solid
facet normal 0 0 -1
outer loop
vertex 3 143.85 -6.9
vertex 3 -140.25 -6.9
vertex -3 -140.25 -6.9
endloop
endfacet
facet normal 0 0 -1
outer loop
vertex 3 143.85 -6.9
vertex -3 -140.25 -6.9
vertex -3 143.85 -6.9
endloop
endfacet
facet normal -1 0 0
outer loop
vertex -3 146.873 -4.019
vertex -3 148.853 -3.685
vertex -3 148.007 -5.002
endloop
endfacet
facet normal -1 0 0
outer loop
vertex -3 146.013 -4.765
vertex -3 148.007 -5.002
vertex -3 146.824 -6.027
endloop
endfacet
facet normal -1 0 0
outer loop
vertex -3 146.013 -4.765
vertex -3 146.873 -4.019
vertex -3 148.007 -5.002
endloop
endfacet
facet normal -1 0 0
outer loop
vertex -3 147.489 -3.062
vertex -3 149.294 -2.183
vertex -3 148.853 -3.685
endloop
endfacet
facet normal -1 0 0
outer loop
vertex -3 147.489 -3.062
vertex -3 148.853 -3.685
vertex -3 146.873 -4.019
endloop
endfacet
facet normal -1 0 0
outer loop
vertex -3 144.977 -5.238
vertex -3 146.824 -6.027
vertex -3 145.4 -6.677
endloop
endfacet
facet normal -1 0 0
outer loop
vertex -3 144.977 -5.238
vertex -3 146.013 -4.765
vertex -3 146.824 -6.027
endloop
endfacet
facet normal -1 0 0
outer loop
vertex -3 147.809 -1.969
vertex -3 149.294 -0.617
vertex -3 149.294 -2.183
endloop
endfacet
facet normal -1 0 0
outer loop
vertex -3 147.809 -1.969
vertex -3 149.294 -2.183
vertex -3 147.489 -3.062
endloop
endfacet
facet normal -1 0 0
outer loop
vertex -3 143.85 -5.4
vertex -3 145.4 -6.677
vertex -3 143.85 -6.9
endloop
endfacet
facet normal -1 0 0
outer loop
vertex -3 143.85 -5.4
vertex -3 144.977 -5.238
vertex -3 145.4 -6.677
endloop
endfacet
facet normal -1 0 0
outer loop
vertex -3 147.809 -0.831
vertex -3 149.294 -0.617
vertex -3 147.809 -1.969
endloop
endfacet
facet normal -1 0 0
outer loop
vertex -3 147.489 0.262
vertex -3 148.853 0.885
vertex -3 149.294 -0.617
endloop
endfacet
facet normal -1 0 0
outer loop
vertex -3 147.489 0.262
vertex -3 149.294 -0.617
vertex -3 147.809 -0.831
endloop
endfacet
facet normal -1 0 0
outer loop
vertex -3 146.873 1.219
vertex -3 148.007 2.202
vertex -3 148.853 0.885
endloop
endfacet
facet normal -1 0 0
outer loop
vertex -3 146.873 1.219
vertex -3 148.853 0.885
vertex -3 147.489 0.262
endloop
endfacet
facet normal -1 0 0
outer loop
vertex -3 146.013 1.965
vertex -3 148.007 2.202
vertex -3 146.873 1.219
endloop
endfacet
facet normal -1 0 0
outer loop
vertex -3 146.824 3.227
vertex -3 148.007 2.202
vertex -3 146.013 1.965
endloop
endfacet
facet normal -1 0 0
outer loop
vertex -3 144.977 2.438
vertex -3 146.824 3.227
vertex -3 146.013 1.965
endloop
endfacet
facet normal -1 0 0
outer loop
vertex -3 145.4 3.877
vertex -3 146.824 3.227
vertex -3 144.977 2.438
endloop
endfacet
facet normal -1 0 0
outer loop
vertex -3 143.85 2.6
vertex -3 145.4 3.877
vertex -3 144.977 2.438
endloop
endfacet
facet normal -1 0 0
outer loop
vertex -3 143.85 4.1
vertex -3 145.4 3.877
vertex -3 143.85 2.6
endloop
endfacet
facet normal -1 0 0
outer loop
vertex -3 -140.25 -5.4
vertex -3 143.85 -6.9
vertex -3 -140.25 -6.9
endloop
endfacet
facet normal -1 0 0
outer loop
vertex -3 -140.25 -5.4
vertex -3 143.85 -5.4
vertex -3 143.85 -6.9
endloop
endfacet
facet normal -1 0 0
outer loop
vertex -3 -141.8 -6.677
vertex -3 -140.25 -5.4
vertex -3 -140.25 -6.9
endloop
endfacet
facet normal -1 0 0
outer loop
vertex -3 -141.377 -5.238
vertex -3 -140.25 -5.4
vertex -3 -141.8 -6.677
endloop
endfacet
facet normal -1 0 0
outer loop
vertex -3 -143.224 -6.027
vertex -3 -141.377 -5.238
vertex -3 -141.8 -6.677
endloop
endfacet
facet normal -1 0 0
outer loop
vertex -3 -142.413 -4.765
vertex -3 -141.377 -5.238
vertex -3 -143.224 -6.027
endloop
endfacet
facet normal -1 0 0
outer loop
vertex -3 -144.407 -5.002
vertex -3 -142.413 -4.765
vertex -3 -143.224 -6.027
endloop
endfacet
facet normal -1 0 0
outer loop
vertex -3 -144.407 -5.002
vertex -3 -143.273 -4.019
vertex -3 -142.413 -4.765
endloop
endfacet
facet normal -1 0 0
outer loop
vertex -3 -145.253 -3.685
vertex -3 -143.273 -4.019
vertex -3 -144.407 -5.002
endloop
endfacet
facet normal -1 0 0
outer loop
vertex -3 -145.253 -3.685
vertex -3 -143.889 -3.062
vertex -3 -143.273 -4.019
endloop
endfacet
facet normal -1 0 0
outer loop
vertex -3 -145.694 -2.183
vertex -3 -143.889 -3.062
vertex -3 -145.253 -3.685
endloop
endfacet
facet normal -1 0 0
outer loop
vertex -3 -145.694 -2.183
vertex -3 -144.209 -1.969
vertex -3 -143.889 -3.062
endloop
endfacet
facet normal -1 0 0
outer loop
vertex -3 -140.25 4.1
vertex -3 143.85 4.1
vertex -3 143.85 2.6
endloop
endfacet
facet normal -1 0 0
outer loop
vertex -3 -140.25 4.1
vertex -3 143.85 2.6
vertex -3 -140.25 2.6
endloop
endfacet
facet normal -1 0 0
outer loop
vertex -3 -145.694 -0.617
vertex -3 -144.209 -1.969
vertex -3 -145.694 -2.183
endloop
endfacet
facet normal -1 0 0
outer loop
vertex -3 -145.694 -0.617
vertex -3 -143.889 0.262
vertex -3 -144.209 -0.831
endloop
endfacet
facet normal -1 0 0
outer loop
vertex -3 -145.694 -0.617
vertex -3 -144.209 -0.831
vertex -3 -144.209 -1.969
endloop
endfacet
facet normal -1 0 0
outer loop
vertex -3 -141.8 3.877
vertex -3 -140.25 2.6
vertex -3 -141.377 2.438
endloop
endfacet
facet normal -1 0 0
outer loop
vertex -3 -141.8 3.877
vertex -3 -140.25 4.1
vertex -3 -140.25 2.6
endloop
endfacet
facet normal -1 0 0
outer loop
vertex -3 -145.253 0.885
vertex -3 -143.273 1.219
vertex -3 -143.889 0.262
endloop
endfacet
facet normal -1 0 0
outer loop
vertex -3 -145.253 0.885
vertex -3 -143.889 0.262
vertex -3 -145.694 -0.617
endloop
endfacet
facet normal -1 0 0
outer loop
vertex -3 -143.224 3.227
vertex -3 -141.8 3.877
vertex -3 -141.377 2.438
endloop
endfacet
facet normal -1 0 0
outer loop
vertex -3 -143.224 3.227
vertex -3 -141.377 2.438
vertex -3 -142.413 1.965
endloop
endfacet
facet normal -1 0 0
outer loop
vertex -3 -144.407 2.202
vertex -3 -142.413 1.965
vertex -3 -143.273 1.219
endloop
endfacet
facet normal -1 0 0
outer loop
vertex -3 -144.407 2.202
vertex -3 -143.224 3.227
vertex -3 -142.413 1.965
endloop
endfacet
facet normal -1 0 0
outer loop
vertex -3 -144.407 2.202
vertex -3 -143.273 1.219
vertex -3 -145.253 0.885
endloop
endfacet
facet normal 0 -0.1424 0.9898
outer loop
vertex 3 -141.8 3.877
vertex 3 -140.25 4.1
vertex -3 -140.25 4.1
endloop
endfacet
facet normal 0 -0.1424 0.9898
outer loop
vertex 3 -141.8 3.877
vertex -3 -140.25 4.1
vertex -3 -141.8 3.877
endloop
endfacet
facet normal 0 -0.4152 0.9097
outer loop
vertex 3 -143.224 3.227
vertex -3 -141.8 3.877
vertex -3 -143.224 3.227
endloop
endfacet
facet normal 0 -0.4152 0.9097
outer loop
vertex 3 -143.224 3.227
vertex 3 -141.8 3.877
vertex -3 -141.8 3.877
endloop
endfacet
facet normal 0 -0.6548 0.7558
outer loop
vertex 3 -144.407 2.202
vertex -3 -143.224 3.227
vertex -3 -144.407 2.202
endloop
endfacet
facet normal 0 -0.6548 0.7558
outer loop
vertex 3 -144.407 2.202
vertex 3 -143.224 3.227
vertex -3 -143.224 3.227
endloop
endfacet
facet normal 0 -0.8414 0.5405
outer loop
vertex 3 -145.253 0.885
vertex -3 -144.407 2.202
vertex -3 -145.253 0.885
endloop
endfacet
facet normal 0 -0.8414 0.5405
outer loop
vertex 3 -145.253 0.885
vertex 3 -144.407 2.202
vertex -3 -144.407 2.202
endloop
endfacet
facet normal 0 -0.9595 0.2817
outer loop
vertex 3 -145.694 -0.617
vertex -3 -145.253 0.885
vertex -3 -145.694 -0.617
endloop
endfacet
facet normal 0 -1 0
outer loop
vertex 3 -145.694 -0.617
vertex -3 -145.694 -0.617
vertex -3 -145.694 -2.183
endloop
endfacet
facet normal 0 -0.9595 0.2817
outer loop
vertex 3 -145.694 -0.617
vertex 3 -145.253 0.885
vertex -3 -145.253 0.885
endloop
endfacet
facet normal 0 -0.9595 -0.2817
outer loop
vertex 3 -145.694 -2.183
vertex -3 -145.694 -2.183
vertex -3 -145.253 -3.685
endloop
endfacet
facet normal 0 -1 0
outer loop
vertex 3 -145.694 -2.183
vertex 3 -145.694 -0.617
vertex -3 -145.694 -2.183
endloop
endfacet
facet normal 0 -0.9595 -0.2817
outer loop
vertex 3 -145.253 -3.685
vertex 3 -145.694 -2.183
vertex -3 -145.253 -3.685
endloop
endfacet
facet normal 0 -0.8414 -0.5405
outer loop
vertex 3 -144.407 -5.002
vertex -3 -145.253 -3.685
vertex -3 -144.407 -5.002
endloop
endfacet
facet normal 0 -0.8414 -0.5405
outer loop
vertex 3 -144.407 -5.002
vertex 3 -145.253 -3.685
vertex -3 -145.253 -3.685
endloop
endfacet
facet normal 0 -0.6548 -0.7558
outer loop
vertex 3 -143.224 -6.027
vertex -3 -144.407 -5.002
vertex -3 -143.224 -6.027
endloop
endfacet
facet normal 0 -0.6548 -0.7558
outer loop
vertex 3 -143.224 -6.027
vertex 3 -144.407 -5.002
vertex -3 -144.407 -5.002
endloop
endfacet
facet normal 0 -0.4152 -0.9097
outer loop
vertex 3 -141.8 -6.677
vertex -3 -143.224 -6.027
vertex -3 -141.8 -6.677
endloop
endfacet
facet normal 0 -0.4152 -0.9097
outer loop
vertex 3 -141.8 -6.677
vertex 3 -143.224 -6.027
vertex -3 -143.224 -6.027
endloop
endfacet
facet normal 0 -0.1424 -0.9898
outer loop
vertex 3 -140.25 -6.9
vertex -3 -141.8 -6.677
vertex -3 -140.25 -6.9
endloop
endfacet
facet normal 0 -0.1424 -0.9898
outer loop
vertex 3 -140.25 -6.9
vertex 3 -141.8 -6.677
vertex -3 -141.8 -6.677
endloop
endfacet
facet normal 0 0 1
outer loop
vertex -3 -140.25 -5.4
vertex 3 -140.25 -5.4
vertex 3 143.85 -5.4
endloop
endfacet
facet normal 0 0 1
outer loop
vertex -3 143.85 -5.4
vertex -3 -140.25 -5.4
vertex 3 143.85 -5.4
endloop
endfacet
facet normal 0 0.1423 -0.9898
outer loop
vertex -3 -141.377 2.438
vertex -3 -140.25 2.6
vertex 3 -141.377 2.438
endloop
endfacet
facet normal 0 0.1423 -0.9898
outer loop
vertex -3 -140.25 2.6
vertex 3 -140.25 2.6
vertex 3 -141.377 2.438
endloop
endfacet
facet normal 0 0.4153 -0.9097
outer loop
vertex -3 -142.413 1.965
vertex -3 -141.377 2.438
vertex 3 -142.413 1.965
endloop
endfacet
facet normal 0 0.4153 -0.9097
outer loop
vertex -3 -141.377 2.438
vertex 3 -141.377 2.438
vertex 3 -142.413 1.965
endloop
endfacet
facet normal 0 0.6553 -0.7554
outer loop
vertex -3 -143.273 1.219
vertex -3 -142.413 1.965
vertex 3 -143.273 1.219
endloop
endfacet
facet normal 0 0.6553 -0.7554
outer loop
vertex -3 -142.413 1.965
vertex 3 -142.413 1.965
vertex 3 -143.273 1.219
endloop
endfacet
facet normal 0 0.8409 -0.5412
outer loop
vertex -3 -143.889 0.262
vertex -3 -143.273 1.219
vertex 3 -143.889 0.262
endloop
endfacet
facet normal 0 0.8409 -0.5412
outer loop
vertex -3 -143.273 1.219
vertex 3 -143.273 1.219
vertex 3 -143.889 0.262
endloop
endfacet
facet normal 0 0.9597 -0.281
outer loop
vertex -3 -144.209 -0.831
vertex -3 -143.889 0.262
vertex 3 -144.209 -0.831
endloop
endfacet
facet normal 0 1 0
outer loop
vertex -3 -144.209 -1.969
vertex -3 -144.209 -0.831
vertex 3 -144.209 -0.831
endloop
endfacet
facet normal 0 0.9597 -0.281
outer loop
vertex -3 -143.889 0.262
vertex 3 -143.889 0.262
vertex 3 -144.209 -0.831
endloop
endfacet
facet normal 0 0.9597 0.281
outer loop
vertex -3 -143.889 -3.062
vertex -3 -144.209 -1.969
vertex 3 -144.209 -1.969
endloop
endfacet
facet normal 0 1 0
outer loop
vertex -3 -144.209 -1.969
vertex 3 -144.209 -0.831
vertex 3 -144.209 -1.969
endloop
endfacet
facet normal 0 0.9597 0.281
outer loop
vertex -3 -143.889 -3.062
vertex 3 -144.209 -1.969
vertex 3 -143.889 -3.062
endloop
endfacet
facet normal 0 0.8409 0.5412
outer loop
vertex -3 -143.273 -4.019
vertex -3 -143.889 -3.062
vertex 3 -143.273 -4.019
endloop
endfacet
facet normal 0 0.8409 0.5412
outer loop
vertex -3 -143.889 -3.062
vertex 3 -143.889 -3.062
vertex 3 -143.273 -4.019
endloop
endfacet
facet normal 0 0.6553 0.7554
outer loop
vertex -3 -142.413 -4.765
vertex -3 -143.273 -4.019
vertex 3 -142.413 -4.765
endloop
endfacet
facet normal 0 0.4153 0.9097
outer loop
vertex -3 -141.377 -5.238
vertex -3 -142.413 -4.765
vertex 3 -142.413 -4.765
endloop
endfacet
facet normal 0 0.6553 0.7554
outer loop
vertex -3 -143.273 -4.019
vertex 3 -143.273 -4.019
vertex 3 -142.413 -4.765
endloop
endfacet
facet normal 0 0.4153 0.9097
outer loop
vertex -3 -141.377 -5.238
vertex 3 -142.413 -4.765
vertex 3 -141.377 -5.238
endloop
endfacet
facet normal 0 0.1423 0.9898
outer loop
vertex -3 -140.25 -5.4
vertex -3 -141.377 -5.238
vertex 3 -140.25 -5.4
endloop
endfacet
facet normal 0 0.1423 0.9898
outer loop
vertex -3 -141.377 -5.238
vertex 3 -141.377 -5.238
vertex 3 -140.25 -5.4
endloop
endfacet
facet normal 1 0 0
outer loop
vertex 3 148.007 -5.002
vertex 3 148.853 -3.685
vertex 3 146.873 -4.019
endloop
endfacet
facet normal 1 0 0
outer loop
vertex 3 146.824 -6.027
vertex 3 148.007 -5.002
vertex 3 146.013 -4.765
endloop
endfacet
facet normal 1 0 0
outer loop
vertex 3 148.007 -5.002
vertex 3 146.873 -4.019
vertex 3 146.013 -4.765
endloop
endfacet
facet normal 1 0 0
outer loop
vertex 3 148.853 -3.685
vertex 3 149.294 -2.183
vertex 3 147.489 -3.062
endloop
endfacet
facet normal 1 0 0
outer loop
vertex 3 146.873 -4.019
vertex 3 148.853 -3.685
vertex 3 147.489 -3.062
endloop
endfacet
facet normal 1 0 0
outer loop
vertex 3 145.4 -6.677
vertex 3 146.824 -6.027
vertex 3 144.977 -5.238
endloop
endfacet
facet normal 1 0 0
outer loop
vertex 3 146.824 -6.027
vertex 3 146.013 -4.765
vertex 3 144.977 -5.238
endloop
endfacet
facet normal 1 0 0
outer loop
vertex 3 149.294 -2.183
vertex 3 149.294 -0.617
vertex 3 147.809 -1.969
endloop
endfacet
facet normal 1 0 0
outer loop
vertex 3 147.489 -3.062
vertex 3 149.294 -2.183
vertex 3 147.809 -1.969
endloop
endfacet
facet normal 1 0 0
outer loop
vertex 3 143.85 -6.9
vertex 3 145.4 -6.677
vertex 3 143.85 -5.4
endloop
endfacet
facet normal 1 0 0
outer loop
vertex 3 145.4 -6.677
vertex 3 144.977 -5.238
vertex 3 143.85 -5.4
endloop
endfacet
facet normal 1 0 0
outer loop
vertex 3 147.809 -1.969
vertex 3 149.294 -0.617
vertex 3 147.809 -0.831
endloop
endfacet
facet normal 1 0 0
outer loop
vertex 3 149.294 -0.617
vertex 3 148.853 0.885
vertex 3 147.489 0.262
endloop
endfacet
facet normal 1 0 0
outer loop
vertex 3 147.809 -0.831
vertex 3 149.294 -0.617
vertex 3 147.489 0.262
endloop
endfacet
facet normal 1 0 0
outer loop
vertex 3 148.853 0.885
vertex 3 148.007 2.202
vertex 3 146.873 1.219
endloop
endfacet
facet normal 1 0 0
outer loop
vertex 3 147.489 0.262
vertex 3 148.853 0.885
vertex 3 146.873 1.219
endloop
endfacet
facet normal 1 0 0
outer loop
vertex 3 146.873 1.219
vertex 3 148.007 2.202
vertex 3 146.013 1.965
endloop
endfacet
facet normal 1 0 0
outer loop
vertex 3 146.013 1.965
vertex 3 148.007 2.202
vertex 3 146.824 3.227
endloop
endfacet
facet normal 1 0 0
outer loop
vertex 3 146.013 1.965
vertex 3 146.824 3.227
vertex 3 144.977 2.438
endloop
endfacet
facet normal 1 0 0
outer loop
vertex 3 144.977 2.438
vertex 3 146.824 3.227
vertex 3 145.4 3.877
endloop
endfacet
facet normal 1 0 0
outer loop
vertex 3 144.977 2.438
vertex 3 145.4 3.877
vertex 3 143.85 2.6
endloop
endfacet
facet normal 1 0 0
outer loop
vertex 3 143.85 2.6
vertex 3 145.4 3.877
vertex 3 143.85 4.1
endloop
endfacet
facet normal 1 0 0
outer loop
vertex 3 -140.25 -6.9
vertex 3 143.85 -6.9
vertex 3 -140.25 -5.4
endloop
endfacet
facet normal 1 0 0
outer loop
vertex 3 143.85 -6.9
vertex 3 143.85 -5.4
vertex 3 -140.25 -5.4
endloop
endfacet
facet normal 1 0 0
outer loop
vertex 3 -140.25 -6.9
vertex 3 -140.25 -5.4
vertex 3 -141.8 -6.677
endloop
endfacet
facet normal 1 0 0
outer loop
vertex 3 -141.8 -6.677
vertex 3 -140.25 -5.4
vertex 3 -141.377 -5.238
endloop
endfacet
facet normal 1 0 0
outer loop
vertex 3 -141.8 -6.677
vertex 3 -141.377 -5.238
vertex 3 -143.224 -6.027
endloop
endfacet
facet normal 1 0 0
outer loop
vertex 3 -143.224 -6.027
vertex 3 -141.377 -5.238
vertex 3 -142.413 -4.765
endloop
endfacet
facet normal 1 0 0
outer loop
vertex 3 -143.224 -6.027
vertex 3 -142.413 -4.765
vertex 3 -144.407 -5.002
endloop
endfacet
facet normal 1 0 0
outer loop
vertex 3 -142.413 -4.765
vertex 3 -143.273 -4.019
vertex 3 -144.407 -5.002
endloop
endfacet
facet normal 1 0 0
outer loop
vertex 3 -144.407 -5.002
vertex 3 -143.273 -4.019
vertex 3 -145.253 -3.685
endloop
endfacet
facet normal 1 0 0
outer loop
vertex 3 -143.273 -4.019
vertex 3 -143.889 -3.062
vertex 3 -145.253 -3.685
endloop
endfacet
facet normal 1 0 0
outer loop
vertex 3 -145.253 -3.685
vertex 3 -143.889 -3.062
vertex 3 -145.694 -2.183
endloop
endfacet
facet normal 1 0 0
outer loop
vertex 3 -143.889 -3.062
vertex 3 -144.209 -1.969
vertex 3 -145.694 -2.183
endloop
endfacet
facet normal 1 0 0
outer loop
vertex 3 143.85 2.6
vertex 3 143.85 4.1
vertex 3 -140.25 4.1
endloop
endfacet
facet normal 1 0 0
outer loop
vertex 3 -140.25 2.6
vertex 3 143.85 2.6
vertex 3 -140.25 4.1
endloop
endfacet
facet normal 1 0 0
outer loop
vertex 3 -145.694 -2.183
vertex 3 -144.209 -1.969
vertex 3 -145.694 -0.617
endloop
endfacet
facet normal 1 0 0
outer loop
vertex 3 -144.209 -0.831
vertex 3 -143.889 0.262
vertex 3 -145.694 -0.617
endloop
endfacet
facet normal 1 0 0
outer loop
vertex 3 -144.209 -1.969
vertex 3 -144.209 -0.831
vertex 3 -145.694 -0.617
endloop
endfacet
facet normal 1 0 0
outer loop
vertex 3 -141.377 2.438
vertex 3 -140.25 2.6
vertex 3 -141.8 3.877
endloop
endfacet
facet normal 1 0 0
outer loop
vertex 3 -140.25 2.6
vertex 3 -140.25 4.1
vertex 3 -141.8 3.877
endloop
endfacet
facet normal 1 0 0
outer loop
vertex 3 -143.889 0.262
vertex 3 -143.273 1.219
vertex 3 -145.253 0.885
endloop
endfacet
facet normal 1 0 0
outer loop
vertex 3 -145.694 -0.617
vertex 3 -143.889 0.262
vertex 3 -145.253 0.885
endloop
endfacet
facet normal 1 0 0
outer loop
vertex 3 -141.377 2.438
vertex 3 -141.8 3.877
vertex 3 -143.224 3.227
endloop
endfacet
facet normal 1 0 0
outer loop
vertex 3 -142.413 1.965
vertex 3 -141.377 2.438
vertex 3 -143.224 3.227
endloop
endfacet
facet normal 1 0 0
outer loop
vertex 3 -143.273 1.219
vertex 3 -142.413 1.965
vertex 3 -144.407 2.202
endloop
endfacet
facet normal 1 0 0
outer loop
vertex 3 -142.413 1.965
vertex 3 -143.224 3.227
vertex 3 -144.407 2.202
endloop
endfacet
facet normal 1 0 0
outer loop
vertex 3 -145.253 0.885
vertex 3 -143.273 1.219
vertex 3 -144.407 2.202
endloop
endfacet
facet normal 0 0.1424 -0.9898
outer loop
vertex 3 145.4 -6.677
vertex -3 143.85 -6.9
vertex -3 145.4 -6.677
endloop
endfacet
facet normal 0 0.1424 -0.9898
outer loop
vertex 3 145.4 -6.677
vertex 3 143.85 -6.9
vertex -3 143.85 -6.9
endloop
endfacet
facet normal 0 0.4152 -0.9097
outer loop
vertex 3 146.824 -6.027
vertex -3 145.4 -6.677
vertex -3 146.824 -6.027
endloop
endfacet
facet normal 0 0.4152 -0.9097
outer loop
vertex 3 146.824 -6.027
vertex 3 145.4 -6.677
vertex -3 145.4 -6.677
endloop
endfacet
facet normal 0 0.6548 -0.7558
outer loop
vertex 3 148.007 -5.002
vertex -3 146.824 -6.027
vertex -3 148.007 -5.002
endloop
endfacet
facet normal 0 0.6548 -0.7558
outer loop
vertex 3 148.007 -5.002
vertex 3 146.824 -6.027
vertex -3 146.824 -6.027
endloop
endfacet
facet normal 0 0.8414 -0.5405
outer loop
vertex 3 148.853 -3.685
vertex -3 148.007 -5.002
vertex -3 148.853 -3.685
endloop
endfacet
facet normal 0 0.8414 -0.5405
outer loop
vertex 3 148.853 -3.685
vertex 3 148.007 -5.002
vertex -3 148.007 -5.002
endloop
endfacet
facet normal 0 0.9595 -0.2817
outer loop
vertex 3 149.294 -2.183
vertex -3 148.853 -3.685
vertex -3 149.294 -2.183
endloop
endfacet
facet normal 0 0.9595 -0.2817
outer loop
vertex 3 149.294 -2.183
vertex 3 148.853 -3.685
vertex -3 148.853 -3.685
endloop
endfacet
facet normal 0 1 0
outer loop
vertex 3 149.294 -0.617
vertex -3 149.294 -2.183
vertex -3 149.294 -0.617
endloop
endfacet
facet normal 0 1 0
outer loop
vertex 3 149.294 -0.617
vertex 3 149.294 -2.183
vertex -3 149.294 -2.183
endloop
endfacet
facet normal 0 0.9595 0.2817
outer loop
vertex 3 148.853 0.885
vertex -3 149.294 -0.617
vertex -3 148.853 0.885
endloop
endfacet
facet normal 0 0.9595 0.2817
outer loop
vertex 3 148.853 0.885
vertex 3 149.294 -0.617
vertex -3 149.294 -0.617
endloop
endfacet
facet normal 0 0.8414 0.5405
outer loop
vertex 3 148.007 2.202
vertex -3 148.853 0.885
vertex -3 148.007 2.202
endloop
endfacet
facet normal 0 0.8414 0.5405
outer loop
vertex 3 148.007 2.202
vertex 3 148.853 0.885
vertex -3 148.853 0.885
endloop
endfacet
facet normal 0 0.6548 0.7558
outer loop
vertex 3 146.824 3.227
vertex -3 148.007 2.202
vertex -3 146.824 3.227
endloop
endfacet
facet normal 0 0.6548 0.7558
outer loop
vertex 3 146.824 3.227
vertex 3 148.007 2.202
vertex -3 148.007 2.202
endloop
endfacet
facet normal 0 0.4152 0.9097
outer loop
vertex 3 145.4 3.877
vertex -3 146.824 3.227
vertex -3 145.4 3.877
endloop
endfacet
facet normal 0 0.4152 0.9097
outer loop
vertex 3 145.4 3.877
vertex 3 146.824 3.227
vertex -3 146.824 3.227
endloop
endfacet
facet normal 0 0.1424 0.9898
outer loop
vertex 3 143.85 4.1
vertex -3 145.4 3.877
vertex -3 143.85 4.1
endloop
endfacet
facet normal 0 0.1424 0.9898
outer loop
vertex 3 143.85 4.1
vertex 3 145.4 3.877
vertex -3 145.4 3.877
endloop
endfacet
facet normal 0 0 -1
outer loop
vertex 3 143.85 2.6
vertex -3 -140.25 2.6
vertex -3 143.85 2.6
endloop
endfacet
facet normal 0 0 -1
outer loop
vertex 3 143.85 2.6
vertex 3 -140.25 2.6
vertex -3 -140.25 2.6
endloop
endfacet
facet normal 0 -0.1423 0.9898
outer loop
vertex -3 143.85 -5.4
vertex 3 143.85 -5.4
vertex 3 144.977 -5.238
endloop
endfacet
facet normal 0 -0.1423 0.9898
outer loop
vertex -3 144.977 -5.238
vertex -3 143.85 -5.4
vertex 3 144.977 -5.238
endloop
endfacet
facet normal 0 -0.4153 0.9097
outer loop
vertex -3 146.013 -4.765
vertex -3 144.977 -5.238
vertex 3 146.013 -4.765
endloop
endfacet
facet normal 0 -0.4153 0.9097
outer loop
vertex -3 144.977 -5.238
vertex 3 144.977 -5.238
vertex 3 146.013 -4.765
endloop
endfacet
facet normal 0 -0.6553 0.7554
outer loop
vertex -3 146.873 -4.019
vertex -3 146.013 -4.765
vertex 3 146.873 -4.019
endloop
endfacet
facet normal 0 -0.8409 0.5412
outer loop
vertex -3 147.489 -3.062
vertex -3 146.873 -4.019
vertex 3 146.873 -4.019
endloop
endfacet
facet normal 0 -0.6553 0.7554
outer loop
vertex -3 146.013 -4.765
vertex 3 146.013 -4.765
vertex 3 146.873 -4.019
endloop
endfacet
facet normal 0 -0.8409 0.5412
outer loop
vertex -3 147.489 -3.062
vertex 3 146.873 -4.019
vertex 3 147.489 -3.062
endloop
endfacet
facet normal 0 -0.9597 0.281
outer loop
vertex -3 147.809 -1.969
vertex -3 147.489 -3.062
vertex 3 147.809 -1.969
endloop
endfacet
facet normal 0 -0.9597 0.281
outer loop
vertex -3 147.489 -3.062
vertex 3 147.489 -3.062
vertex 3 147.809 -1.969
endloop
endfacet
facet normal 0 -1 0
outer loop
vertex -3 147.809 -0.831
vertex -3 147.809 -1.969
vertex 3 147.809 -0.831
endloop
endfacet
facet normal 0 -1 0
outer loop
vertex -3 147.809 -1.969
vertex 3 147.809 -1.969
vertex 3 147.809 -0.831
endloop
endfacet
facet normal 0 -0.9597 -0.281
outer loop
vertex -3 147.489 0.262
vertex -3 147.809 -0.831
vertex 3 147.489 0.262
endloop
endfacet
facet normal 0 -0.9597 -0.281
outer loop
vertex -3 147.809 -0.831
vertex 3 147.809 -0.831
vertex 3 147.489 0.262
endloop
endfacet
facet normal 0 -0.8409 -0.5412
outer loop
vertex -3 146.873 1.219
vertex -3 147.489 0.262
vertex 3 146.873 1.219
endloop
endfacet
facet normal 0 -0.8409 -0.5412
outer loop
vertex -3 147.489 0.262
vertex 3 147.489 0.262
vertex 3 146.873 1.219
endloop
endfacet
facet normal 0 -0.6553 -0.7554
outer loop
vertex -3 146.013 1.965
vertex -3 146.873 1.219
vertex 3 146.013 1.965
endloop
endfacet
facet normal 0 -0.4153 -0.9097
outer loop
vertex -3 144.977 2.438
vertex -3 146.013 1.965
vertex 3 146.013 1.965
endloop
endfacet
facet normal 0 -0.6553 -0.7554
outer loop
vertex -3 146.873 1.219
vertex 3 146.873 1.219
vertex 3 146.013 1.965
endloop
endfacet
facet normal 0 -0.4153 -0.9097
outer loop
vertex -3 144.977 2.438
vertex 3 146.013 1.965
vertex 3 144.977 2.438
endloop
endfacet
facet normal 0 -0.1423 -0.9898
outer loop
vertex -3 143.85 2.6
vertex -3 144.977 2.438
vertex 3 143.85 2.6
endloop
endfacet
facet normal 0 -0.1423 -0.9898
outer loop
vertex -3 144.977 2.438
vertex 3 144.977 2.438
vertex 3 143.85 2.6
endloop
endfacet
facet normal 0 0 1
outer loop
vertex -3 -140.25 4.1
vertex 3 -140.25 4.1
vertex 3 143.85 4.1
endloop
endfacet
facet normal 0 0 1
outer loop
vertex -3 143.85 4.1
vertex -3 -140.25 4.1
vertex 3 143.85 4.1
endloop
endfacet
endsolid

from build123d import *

# Parameters (mm, degrees)
PAD_DEPTH = 3


with BuildPart() as part:
    # Sketch → Pad (new body, symmetric)
    with BuildSketch(Plane.YZ):
        with BuildLine():
            Line((-140.250008, 5.5), (143.850007, 5.5))
            ThreePointArc((143.850007, -5.5), (149.35, 0), (143.850007, 5.5))
            Line((-140.250008, -5.5), (143.850007, -5.5))
            ThreePointArc((-140.250008, 5.5), (-145.75, 0), (-140.250008, -5.5))
        make_face()
        with BuildLine():
            Line((-140.250008, 4), (143.850007, 4))
            ThreePointArc((143.850007, -4), (147.85, 0), (143.850007, 4))
            Line((-140.250008, -4), (143.850007, -4))
            ThreePointArc((-140.250008, 4), (-144.25, 0), (-140.250008, -4))
        make_face(mode=Mode.SUBTRACT)
    extrude(amount=PAD_DEPTH, both=True)


with BuildPart() as part_1:
    # Body placement: moved
    add(part.part.moved(Location((0, 0, -1.4))))


solid = part_1.part
